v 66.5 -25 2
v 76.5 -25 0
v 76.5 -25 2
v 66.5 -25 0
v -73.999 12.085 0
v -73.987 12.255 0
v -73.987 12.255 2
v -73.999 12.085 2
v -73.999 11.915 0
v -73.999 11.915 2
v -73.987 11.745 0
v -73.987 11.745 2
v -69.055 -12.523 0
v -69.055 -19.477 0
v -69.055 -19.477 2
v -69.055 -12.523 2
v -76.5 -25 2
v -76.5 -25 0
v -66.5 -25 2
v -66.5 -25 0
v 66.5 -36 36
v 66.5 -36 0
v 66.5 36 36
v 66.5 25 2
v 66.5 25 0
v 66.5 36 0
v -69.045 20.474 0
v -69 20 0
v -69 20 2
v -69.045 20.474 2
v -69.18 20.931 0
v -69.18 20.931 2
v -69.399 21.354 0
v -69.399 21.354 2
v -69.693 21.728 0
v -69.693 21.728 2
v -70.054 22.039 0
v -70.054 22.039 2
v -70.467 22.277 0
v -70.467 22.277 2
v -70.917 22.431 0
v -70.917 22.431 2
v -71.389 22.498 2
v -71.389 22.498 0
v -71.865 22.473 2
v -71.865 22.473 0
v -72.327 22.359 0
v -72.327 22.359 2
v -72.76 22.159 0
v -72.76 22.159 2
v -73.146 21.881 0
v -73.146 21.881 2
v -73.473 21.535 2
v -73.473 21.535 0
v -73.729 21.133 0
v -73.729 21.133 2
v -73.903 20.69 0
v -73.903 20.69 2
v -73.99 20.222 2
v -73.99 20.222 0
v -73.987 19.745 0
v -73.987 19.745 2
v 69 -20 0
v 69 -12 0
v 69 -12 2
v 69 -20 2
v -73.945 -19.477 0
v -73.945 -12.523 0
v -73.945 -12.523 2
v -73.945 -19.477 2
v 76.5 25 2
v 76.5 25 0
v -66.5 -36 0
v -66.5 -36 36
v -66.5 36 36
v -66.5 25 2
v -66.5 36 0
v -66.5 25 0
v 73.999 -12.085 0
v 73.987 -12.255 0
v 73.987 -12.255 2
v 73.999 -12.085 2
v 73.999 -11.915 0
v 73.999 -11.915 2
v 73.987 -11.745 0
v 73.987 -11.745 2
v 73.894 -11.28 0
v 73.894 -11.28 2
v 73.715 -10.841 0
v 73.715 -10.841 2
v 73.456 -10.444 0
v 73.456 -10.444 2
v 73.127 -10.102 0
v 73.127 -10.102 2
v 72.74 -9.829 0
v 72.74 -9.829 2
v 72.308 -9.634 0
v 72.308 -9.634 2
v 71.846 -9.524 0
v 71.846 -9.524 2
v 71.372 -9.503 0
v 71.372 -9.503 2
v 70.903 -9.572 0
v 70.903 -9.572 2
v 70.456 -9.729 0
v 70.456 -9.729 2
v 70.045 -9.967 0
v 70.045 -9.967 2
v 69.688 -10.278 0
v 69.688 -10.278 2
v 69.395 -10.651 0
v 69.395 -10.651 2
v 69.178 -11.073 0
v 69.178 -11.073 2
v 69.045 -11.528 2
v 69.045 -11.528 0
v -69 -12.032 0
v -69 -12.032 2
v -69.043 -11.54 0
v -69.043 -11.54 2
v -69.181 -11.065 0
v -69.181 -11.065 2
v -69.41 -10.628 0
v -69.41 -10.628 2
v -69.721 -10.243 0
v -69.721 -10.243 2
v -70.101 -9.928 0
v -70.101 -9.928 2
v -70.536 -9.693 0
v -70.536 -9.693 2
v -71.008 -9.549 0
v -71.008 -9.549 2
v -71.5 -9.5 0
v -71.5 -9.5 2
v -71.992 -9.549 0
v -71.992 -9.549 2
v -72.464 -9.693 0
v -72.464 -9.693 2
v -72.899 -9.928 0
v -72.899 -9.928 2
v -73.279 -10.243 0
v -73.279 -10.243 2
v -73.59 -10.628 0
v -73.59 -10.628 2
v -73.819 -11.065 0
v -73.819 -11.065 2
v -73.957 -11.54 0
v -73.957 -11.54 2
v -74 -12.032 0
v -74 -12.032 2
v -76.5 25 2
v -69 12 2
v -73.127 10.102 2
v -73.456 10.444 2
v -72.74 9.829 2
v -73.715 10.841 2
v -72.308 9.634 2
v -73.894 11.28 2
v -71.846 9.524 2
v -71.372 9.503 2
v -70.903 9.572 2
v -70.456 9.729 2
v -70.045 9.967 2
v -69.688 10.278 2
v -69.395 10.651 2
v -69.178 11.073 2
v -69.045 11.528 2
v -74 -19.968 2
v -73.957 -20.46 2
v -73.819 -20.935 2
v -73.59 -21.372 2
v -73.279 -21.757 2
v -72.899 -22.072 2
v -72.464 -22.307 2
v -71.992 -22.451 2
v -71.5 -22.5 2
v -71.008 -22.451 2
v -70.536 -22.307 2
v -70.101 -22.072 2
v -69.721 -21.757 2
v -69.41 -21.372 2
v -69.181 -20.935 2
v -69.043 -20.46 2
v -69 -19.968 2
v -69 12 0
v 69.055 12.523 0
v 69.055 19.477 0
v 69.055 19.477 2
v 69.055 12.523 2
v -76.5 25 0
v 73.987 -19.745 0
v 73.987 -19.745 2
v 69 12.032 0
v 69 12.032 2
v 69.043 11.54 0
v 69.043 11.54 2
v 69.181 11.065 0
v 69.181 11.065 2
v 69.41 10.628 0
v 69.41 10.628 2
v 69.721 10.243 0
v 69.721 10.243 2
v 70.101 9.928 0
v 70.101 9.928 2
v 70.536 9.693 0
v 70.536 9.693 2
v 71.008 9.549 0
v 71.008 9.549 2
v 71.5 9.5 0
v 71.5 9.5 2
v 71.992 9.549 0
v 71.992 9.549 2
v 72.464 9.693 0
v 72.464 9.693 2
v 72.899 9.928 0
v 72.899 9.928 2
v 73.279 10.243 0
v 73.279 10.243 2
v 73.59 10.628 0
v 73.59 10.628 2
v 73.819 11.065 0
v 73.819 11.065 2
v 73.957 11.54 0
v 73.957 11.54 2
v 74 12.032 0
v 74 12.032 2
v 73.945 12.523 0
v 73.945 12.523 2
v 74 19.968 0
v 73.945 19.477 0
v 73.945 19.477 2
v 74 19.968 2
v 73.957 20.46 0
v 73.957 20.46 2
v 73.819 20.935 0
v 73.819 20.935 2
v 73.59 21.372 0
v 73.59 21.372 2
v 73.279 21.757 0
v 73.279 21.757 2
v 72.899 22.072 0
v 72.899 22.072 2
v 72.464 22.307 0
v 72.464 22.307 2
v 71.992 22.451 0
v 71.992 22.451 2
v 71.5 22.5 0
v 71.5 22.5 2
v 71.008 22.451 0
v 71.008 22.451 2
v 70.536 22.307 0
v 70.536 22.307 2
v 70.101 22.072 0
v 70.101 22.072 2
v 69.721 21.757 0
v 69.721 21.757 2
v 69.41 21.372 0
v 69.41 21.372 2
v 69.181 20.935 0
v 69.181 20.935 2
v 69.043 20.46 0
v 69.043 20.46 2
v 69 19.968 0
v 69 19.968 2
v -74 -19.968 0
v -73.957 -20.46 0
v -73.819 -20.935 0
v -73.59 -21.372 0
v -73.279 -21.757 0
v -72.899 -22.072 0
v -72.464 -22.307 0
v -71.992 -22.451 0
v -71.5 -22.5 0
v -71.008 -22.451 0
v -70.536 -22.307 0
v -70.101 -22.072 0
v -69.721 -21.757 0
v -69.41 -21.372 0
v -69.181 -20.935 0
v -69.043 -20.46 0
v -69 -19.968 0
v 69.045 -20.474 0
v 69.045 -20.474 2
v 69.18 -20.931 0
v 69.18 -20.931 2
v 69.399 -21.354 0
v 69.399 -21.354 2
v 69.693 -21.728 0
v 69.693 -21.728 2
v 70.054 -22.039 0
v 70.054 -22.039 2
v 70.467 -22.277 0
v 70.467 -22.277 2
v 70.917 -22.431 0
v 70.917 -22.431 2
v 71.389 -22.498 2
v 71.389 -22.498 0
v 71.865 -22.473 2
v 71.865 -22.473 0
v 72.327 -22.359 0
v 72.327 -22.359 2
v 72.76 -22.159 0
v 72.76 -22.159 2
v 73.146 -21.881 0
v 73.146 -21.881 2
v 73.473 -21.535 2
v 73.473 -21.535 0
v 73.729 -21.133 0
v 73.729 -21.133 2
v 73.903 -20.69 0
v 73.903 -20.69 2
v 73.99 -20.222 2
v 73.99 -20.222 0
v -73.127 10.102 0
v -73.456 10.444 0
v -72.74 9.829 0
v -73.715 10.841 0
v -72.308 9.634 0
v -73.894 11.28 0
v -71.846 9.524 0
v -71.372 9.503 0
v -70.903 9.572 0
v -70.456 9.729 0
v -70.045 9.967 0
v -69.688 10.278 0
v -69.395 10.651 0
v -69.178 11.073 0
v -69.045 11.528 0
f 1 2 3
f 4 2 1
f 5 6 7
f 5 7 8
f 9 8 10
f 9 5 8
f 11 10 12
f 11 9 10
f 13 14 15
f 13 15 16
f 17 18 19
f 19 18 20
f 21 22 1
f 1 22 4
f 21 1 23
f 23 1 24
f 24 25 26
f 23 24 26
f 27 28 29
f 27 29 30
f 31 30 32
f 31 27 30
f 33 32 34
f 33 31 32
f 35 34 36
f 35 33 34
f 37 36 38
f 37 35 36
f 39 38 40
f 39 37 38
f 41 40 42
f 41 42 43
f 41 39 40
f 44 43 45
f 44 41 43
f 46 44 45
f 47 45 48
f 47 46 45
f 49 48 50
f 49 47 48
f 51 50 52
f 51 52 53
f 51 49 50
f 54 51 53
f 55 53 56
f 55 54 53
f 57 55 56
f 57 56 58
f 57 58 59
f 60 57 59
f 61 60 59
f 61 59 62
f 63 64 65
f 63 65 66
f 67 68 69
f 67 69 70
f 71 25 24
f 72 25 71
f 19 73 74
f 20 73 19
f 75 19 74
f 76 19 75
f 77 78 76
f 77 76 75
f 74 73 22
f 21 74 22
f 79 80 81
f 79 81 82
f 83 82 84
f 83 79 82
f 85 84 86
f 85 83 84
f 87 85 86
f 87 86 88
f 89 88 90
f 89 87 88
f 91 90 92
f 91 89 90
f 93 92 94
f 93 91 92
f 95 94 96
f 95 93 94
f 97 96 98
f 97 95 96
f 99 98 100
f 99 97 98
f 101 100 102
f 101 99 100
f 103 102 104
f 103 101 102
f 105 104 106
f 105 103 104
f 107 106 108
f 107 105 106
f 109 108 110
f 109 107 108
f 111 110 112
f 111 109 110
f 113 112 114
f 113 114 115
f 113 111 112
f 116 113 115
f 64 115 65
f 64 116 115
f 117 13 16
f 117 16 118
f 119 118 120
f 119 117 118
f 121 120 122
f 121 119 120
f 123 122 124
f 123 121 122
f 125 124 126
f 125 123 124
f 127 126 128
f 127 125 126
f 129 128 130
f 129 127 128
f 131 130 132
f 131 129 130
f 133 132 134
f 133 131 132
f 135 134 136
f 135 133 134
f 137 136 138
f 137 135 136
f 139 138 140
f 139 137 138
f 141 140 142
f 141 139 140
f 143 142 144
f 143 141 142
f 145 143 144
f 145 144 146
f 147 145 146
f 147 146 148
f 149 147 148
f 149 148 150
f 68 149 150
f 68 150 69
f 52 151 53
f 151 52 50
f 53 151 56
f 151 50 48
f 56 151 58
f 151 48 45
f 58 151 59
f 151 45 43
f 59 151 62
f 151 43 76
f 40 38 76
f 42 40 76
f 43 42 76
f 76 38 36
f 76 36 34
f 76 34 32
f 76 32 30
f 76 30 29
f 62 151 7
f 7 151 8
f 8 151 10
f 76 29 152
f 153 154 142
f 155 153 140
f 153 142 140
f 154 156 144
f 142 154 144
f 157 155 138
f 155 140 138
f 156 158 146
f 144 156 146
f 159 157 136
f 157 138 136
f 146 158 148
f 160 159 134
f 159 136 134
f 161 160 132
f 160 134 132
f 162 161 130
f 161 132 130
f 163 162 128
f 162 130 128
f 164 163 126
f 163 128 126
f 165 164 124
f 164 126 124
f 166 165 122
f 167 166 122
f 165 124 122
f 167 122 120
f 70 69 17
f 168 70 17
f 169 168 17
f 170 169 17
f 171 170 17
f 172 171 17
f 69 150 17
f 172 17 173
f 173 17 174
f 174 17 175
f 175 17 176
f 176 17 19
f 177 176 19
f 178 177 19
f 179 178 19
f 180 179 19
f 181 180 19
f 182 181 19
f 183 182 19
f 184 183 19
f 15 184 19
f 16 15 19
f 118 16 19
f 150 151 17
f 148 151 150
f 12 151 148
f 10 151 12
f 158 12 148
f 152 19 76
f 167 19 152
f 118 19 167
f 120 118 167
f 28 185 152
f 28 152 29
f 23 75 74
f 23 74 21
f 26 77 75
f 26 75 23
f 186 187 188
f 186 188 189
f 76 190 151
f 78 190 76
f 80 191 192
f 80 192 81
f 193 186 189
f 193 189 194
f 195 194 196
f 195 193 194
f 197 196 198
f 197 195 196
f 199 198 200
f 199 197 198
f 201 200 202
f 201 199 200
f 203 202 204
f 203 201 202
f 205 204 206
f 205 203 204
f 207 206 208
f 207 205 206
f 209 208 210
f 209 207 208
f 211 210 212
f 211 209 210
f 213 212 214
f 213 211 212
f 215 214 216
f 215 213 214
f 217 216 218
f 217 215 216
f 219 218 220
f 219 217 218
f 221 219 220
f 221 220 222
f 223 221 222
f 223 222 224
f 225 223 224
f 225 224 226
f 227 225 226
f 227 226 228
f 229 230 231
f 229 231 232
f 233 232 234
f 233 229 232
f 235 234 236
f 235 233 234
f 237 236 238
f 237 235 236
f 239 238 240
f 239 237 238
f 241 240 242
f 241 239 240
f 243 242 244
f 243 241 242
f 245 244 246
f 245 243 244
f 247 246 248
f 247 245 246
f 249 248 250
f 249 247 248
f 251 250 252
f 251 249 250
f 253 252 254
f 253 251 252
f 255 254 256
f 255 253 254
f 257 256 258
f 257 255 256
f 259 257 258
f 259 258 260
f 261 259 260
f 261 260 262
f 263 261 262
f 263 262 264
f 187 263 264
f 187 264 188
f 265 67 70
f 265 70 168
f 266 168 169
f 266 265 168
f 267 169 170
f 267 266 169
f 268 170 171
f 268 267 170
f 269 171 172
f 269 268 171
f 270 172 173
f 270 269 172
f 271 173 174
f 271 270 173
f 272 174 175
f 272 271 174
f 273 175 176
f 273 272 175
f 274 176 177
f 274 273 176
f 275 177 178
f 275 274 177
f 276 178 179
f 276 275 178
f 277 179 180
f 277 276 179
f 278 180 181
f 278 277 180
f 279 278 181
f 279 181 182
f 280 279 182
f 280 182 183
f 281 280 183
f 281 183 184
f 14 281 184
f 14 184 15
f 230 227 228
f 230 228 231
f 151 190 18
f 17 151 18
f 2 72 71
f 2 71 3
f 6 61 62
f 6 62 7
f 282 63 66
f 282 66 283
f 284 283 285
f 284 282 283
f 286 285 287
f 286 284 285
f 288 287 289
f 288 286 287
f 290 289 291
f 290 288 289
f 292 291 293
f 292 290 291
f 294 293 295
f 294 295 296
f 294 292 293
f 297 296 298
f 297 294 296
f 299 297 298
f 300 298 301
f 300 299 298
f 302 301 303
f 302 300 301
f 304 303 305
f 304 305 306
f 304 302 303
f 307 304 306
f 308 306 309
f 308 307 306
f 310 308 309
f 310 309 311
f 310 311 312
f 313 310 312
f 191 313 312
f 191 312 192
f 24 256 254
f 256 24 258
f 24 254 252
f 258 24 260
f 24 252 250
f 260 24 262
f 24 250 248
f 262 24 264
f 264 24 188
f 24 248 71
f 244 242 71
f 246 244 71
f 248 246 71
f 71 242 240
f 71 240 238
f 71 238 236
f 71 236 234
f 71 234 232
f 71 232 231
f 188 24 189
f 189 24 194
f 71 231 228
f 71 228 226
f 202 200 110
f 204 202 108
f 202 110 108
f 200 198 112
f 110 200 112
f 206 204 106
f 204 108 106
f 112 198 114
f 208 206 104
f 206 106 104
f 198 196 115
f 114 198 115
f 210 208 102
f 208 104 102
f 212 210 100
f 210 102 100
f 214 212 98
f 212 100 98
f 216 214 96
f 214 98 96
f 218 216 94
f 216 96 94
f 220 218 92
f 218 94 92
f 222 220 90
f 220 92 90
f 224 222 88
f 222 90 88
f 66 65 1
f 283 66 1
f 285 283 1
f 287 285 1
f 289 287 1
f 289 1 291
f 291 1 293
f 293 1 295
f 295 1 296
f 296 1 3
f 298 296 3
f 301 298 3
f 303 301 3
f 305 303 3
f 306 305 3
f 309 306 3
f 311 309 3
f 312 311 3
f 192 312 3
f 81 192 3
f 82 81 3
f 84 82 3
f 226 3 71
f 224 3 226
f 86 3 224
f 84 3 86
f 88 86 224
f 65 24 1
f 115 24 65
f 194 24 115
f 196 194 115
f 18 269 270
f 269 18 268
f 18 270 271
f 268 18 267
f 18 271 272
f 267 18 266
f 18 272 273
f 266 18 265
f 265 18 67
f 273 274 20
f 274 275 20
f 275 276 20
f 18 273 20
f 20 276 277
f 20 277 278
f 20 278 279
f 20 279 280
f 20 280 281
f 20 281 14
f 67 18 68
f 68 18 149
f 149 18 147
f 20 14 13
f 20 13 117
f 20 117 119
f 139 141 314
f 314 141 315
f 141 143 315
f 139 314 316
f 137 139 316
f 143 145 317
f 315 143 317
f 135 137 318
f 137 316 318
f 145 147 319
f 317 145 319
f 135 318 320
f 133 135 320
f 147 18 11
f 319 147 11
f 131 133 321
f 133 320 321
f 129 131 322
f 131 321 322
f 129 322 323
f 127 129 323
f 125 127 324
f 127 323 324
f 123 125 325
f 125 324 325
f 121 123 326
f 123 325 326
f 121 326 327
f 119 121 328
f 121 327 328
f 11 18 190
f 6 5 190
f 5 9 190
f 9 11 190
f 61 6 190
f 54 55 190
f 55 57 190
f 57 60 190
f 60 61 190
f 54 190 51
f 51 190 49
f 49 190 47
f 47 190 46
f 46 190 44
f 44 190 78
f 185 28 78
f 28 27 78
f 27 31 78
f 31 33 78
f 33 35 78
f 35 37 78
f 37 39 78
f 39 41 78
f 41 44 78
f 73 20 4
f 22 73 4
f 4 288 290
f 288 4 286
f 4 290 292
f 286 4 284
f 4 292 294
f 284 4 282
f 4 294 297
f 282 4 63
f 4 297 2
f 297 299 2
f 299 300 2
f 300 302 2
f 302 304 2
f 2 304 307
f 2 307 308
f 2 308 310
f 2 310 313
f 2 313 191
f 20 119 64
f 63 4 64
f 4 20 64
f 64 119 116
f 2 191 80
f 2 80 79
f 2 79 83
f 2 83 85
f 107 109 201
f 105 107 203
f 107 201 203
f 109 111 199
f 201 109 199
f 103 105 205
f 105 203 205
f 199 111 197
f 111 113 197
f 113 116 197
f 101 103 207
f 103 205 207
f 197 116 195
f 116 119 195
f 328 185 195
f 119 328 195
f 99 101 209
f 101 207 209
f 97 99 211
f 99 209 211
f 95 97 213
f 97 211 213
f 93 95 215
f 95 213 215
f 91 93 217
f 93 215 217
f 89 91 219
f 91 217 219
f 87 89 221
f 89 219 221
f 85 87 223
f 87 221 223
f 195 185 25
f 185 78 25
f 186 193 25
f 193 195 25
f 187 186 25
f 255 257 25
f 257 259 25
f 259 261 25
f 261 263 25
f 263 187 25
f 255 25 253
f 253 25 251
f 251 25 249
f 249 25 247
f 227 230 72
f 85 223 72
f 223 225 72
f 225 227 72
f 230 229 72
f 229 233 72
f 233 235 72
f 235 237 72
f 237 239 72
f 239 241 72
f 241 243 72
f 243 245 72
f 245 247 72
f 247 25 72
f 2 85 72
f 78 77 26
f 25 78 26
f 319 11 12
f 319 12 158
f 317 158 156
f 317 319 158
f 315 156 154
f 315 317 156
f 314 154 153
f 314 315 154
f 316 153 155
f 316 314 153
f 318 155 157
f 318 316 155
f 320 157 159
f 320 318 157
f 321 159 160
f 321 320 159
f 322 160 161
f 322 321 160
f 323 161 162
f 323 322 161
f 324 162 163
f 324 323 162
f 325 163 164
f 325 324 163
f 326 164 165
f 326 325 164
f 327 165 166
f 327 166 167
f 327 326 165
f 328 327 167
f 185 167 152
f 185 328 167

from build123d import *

# Parameters (mm, degrees)
F0_W     = 133
F0_H     = 72
F1_DEPTH = 36
F2_W     = 10
F2_H     = 50
F3_DEPTH = 2
F5_DEPTH = 2


with BuildPart() as f1:
    # F0 (on Top) → F1 (new body)
    with BuildSketch(Plane.XY):
        Rectangle(F0_W, F0_H)
    extrude(amount=F1_DEPTH)

    # F2 (on face) → F3 (join)
    with BuildSketch(Plane(origin=(0, 0, 0), x_dir=(1, 0, 0), z_dir=(0, 0, -1))):
        with Locations((-71.5, 0)):
            Rectangle(F2_W, F2_H)
        with BuildLine():
            ThreePointArc((-69, -20), (-71.627534, -22.496745), (-73.986988, -19.745264))
            Line((-73.986988, -19.745264), (-73.986988, -12.254736))
            ThreePointArc((-73.986988, -12.254736), (-74, -12), (-73.986988, -11.745264))
            ThreePointArc((-73.986988, -11.745264), (-71.372466, -9.503255), (-69, -12))
            Line((-69, -12), (-69, -20))
        make_face(mode=Mode.SUBTRACT)
        with BuildLine():
            ThreePointArc((-73.944746, 19.477297), (-71.5, 22.5), (-69.055254, 19.477297))
            Line((-69.055254, 19.477297), (-69.055254, 12.522703))
            ThreePointArc((-69.055254, 12.522703), (-71.5, 9.5), (-73.944746, 12.522703))
            Line((-73.944746, 12.522703), (-73.944746, 19.477297))
        make_face(mode=Mode.SUBTRACT)
    extrude(amount=-F3_DEPTH)

    # F4 (on face) → F5 (join)
    with BuildSketch(Plane(origin=(0, 0, 0), x_dir=(1, 0, 0), z_dir=(0, 0, -1))):
        Polygon((66.5, 0), (66.5, -25), (76.5, -25), (76.5, 25), (66.5, 25), align=None)
        with BuildLine():
            ThreePointArc((73.944746, -19.477297), (71.5, -22.5), (69.055254, -19.477297))
            Line((69.055254, -19.477297), (69.055254, -12.522703))
            ThreePointArc((69.055254, -12.522703), (71.5, -9.5), (73.944746, -12.522703))
            Line((73.944746, -12.522703), (73.944746, -19.477297))
        make_face(mode=Mode.SUBTRACT)
        with BuildLine():
            ThreePointArc((69, 20), (71.627534, 22.496745), (73.986988, 19.745264))
            Line((73.986988, 19.745264), (73.986988, 12.254736))
            ThreePointArc((73.986988, 12.254736), (74, 12), (73.986988, 11.745264))
            ThreePointArc((73.986988, 11.745264), (71.372466, 9.503255), (69, 12))
            Line((69, 12), (69, 20))
        make_face(mode=Mode.SUBTRACT)
    extrude(amount=-F5_DEPTH)


solid = f1.part
